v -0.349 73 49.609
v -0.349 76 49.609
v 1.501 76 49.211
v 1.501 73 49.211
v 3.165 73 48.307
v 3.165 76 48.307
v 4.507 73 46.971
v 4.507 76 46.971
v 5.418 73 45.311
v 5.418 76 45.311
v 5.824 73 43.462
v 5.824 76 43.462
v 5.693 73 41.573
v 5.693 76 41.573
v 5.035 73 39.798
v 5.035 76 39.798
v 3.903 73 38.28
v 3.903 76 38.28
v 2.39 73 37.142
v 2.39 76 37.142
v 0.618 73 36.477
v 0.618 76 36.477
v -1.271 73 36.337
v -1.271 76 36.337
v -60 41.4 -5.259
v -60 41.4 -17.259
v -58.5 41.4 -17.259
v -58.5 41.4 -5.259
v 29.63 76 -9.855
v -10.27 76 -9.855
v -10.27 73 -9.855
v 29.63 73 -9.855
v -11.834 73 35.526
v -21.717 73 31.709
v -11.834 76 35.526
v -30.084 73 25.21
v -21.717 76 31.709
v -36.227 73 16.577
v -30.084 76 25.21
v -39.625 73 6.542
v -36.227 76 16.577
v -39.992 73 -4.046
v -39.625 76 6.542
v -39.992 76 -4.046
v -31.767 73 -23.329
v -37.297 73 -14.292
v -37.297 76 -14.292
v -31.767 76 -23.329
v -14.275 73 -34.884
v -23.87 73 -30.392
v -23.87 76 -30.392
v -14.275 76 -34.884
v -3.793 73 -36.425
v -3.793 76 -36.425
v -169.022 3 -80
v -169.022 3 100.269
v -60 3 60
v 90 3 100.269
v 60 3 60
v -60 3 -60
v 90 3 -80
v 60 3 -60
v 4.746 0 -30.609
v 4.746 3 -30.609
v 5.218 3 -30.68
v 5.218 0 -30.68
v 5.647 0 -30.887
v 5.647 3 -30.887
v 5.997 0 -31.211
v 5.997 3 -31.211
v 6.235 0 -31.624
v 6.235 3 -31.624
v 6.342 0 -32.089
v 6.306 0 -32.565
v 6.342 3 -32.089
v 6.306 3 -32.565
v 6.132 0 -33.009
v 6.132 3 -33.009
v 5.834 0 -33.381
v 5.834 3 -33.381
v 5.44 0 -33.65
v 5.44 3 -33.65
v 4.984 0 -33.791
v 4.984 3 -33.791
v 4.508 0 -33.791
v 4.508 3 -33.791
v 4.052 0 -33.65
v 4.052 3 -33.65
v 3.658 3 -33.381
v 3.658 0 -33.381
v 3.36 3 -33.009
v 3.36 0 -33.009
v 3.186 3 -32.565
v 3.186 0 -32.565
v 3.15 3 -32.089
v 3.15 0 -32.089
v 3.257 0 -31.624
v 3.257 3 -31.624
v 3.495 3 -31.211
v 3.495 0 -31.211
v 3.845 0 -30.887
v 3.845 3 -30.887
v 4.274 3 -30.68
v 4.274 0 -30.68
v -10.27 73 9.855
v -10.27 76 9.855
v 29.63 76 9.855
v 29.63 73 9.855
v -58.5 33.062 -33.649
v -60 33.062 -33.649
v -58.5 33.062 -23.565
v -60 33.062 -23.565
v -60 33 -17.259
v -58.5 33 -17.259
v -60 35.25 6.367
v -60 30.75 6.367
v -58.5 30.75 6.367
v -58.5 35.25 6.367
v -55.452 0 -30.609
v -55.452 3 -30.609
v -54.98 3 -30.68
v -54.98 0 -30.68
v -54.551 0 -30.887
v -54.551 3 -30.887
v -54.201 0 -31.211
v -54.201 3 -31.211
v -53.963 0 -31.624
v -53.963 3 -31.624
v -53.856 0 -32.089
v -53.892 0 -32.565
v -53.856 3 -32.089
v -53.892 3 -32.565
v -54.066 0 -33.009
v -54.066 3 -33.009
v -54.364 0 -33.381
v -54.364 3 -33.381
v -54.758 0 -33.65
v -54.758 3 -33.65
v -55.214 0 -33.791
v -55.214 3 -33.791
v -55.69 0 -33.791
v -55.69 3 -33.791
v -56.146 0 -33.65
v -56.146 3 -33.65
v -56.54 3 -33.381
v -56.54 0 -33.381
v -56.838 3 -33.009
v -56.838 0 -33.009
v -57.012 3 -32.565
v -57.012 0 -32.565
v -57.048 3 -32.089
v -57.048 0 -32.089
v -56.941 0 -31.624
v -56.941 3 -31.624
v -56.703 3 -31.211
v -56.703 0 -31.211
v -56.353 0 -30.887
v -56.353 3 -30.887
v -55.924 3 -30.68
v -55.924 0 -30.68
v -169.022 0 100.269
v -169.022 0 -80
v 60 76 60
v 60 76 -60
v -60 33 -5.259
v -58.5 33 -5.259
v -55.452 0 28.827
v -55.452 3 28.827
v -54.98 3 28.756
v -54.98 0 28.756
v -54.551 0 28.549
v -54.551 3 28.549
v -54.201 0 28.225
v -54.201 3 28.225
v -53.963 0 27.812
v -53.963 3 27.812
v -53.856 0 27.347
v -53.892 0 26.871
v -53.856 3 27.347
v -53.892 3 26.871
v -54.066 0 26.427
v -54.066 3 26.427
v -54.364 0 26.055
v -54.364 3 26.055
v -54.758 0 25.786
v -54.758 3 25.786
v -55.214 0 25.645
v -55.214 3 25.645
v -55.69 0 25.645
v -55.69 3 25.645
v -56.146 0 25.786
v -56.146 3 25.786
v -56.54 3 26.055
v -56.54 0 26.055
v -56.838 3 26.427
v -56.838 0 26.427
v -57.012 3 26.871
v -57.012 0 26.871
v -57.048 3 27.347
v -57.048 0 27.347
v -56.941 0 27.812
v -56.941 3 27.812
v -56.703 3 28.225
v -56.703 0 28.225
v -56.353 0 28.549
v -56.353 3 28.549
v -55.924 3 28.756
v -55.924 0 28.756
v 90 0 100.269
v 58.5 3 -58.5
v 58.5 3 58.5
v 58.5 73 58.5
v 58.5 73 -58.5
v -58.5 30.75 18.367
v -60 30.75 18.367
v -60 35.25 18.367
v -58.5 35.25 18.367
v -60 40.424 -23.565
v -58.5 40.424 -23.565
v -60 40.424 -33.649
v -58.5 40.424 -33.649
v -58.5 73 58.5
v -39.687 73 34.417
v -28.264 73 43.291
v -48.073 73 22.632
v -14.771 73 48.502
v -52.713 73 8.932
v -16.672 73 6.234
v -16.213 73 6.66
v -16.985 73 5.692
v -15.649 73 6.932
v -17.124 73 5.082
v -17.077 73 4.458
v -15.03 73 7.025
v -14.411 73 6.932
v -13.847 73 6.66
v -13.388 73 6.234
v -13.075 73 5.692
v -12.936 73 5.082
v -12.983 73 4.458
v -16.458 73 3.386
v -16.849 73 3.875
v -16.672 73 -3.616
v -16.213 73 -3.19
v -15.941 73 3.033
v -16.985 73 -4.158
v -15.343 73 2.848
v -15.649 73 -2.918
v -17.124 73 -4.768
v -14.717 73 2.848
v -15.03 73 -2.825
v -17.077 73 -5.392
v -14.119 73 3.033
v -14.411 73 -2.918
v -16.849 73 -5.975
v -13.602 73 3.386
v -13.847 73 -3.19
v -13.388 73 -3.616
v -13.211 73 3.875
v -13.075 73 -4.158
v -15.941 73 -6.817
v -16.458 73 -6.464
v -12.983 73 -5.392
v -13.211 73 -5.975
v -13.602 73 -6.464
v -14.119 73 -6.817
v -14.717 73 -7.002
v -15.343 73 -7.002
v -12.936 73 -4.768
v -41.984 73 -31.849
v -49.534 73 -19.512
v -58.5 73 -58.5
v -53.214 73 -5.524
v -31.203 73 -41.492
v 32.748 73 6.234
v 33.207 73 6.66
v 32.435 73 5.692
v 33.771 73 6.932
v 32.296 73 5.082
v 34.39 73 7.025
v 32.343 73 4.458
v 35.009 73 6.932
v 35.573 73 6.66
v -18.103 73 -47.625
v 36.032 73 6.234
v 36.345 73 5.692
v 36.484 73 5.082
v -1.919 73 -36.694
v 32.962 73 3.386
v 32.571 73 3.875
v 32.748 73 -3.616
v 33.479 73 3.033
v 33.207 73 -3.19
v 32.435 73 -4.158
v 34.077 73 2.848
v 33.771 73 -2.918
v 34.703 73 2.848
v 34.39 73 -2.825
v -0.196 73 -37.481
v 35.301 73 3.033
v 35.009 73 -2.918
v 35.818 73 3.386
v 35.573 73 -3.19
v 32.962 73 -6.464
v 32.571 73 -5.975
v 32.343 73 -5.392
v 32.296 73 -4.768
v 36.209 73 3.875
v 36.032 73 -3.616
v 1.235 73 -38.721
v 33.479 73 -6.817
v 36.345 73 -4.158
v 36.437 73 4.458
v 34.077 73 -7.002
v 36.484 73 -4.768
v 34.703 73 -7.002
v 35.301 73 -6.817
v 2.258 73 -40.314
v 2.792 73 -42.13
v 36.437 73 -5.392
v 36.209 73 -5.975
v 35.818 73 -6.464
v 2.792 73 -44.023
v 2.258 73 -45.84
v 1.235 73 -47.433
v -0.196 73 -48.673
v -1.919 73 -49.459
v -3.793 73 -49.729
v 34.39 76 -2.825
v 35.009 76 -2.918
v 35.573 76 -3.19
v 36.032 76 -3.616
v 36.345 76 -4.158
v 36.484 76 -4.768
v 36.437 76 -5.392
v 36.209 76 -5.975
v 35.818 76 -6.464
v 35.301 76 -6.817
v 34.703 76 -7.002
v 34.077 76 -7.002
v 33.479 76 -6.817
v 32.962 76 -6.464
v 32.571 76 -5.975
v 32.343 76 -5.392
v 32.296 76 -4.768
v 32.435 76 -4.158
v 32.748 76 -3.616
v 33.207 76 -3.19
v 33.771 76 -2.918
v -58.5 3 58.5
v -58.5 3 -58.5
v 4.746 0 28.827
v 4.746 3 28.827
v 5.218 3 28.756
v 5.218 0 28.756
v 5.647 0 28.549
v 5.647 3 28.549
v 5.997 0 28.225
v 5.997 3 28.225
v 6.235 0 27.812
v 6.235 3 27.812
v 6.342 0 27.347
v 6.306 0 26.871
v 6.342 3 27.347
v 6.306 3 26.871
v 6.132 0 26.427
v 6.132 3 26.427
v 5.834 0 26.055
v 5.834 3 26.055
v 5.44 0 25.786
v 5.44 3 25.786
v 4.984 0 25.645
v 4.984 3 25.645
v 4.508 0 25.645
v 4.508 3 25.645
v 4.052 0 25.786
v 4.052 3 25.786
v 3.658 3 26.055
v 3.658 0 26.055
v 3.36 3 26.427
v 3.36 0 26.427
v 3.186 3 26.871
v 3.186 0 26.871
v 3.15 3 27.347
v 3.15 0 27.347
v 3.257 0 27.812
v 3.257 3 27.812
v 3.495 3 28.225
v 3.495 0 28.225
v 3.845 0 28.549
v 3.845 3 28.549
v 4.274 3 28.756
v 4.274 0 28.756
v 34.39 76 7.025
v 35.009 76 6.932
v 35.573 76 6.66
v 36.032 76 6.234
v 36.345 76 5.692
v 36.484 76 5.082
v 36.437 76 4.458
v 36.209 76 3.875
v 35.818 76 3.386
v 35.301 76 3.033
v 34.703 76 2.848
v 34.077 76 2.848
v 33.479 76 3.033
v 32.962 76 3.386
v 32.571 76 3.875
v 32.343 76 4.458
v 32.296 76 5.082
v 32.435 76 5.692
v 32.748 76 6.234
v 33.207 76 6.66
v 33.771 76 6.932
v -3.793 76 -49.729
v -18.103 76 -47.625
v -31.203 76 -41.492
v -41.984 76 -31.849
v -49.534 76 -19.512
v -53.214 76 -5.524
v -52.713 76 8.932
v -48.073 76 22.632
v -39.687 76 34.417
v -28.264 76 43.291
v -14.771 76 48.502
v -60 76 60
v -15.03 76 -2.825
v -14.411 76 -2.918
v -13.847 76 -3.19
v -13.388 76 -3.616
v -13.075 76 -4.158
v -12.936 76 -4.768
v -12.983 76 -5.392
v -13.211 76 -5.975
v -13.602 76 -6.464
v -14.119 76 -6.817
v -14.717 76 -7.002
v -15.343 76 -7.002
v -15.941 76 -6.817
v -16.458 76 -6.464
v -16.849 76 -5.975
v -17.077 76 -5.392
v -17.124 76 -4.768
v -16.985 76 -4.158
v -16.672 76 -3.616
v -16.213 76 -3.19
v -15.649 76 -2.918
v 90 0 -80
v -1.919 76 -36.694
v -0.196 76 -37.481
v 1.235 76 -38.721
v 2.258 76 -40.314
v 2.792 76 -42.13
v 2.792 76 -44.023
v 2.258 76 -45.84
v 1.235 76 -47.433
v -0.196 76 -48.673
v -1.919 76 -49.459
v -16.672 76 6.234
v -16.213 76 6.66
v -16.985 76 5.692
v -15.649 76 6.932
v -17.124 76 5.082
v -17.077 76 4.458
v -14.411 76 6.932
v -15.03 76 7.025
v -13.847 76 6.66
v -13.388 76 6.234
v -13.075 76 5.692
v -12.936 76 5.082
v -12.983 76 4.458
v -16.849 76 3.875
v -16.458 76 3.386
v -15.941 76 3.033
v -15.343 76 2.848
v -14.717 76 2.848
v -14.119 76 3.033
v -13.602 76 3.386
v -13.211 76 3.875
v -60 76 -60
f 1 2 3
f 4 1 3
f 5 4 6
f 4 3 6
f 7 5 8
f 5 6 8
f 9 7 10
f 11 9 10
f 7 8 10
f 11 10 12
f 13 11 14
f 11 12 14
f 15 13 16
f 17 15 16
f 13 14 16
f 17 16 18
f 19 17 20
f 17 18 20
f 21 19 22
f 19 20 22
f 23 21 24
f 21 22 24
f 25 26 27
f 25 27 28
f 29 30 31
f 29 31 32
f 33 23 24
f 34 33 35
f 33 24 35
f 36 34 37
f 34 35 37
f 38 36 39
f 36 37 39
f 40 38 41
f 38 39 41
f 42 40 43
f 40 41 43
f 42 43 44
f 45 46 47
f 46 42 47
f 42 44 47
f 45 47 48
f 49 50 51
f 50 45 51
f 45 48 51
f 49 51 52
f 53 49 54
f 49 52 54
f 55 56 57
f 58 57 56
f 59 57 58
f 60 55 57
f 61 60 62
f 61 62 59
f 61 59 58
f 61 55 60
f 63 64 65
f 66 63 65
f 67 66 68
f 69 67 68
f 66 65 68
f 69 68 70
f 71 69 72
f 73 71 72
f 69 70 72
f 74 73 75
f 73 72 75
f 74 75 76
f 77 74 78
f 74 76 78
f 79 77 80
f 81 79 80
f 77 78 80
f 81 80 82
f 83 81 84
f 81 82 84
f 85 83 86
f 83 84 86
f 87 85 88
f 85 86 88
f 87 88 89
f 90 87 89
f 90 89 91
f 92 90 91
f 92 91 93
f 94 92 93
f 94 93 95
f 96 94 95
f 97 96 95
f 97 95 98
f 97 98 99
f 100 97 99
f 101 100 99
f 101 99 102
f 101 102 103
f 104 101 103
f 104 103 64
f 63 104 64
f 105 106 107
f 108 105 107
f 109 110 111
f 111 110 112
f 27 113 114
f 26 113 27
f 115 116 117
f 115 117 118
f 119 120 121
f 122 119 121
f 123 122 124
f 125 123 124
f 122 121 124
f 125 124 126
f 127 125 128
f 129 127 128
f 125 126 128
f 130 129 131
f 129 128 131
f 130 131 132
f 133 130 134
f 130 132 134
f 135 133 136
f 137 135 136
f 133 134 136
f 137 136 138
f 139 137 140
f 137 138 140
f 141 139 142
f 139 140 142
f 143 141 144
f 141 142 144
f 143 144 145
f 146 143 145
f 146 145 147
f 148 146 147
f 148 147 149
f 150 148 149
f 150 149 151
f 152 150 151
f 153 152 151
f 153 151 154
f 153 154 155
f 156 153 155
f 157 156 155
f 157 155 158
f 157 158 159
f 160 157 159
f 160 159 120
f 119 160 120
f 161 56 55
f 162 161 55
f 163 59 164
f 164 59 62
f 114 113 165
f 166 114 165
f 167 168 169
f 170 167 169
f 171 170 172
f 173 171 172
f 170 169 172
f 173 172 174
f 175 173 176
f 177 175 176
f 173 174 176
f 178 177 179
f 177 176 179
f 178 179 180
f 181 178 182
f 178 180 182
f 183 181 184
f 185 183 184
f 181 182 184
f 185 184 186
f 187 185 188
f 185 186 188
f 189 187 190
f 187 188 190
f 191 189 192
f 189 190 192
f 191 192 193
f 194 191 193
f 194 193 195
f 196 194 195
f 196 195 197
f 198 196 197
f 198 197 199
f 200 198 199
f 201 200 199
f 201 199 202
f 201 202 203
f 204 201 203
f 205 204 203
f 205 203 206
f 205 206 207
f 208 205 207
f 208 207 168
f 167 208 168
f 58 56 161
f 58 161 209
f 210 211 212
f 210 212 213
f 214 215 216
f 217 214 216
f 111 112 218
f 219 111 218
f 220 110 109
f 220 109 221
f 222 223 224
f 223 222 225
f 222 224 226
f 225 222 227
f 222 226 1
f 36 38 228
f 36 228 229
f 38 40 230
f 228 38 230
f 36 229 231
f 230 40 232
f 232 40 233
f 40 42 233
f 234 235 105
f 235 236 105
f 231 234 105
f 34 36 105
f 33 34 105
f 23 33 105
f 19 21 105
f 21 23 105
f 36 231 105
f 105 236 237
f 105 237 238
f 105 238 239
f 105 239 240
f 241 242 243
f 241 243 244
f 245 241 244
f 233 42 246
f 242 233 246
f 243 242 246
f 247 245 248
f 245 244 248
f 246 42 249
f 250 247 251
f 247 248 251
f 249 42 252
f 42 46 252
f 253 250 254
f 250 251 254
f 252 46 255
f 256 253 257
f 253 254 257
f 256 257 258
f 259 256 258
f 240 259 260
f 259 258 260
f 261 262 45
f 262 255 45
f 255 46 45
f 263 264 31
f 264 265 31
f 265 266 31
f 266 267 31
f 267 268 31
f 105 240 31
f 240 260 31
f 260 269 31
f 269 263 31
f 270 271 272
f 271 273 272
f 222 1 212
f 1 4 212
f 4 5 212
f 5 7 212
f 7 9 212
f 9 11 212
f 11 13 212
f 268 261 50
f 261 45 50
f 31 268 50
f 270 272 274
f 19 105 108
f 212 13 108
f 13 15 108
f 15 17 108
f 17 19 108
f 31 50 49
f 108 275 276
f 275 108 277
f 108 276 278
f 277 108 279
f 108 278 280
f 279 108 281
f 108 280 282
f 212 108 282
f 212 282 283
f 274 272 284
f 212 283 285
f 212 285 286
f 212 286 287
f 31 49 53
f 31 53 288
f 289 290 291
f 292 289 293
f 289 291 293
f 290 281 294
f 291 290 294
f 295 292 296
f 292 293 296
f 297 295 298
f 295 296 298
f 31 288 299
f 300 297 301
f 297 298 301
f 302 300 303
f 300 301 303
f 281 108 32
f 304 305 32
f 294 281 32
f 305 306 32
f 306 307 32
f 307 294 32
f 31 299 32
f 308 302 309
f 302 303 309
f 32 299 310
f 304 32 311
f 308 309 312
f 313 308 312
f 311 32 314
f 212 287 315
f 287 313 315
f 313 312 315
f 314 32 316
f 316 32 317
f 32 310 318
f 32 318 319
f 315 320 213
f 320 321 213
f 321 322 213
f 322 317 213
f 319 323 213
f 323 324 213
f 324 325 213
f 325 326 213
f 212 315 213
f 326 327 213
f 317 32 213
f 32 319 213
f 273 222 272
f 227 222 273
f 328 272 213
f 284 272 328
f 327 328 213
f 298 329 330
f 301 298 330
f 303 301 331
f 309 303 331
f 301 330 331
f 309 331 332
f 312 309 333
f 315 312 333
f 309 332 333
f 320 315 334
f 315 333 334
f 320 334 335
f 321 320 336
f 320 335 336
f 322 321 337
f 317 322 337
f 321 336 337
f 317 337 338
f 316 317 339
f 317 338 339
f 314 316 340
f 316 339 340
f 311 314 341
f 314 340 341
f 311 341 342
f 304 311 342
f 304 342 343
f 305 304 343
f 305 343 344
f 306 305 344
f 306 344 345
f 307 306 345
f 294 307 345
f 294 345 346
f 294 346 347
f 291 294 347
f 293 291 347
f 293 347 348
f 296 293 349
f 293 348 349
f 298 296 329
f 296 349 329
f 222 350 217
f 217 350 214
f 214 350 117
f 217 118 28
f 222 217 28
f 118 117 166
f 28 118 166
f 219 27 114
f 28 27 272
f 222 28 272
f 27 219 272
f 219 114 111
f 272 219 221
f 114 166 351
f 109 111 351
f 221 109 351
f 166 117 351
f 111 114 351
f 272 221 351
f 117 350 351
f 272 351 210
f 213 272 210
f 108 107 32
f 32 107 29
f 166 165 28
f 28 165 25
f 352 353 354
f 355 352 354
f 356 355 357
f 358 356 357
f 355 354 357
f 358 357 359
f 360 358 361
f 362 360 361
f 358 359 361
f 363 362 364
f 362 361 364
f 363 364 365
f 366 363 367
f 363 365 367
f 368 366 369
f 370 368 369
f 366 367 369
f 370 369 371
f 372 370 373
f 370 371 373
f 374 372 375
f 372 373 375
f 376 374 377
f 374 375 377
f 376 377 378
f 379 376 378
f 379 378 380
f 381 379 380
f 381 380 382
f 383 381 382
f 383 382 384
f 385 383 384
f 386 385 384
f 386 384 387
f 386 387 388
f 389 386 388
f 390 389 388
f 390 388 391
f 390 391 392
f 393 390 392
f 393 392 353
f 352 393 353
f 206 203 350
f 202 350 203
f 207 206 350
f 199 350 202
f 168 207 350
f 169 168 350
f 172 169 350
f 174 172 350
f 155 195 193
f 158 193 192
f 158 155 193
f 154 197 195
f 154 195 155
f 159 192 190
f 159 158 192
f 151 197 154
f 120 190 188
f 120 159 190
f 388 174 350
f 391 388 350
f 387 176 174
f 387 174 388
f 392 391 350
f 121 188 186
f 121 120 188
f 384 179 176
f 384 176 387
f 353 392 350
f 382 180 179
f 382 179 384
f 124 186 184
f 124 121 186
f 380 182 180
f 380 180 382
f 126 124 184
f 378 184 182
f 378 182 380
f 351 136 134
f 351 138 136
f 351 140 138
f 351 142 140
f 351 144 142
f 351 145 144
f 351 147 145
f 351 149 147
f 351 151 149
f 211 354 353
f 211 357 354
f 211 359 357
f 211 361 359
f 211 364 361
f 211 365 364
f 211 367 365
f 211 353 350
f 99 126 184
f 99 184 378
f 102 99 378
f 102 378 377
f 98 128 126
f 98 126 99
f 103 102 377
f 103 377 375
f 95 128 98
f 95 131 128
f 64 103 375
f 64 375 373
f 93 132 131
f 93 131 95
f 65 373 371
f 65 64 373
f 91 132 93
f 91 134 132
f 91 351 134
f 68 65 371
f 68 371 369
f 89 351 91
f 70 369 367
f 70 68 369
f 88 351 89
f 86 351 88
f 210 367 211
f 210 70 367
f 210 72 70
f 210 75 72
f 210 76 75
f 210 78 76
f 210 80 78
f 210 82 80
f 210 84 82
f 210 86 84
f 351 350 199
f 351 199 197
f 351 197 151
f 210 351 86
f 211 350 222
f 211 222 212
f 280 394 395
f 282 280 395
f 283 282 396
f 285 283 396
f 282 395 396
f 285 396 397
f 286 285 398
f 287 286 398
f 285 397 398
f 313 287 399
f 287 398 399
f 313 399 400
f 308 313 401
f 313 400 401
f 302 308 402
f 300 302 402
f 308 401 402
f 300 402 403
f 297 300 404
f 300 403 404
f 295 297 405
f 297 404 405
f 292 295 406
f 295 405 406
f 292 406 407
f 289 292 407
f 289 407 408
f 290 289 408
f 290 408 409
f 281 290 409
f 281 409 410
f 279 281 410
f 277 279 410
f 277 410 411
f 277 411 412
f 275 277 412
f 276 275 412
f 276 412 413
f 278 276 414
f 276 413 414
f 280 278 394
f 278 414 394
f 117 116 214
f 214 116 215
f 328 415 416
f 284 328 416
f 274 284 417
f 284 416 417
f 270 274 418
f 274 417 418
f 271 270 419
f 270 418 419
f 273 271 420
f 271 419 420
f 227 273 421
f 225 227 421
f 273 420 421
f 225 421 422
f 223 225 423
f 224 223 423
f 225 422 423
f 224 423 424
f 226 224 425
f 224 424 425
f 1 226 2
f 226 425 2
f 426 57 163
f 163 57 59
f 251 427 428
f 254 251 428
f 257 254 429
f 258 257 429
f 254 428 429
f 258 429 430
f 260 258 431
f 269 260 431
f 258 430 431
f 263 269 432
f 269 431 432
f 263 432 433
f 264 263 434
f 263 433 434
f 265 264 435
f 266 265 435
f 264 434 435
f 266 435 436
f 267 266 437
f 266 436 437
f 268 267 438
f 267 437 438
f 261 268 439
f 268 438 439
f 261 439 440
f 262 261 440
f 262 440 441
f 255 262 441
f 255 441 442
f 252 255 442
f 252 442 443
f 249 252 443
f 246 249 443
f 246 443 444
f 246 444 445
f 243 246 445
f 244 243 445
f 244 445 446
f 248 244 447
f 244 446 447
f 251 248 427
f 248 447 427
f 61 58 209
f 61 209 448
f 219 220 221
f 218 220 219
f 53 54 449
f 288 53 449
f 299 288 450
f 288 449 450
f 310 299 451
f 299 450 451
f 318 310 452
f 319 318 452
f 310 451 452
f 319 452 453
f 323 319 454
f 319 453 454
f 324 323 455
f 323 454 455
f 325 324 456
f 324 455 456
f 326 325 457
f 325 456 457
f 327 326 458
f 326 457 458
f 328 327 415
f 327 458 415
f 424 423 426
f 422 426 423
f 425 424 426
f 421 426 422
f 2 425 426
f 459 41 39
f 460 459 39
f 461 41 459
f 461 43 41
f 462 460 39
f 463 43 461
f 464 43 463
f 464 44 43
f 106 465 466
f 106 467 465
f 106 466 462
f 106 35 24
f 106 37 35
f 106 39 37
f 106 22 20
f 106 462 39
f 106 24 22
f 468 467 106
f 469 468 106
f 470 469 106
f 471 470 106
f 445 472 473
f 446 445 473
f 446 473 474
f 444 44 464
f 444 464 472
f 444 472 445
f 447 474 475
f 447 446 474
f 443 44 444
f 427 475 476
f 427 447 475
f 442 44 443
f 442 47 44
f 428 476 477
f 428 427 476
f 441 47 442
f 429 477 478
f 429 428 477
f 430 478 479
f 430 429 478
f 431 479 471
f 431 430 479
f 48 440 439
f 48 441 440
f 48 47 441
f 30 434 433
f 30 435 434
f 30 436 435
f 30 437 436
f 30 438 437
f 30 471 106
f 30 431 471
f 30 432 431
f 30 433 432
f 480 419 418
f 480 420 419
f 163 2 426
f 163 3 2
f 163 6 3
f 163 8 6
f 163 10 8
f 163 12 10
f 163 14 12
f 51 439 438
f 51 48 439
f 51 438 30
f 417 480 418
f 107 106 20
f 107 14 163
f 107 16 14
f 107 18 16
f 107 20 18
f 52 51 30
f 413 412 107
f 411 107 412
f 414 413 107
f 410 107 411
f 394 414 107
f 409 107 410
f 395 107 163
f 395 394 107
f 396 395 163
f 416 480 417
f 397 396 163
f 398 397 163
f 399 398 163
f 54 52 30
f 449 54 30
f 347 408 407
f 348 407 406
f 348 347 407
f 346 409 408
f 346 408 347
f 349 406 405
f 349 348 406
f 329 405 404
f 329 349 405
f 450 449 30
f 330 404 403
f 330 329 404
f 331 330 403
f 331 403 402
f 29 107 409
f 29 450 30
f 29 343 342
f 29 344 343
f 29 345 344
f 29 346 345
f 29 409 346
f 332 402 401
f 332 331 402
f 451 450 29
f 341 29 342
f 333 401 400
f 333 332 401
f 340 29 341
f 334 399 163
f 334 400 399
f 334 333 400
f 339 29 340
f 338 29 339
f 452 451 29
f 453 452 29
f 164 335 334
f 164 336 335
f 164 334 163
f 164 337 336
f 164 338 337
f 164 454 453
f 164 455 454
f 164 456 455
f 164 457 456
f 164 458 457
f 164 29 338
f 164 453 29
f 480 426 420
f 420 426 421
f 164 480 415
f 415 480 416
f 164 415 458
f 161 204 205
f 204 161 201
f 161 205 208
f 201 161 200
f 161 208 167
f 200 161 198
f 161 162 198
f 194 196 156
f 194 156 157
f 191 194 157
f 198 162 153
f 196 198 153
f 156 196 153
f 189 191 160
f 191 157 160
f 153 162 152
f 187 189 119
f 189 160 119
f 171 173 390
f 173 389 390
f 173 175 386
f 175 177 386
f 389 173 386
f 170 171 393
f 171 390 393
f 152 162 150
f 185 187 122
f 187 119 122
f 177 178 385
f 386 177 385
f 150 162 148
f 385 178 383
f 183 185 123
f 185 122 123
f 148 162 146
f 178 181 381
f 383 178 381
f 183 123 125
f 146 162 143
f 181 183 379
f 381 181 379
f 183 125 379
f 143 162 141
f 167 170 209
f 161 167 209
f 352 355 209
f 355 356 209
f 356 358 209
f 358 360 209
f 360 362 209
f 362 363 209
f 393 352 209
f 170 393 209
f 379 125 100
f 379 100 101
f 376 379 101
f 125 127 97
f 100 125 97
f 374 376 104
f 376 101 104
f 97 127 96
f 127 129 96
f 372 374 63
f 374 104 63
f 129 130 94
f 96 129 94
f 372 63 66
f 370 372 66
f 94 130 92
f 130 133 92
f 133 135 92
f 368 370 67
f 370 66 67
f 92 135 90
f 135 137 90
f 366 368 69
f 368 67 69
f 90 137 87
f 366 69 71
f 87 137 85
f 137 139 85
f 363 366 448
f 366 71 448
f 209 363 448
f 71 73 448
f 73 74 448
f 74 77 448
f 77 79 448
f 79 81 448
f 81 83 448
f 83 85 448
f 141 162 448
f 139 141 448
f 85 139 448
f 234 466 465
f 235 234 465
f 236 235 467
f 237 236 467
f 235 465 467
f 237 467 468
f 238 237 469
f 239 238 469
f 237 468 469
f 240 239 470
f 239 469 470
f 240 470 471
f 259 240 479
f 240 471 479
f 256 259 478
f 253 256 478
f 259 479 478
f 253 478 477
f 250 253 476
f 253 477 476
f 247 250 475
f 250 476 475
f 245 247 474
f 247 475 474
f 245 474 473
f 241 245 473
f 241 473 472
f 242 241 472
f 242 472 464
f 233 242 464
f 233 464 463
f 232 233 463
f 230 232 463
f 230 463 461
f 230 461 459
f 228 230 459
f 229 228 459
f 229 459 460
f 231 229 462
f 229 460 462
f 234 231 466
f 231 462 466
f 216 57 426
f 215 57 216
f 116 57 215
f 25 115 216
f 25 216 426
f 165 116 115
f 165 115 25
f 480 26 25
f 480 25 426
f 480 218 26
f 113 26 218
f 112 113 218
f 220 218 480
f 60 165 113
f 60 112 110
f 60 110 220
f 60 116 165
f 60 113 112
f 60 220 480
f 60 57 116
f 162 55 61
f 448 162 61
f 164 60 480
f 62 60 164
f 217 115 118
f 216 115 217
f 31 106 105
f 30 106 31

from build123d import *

# Parameters (mm, degrees)
SKETCH1_W           = 140
SKETCH1_H           = 160
BOSS_EXTRUDE1_DEPTH = 3
SKETCH2_W           = 120
SKETCH2_H           = 120
SKETCH2_W_2         = 117
SKETCH2_H_2         = 117
BOSS_EXTRUDE2_DEPTH = 70
SKETCH4_W           = 120
SKETCH4_H           = 120
BOSS_EXTRUDE4_DEPTH = 3
SKETCH5_R           = 2.1
SKETCH5_W           = 39.9
SKETCH5_H           = 19.71
CUT_EXTRUDE2_DEPTH  = 3
SKETCH6_W           = 18.298163042
SKETCH6_H           = 17.309993256
CUT_EXTRUDE3_DEPTH  = 3
CUT_EXTRUDE8_DEPTH  = 5
SKETCH15_W          = 259.021634325
SKETCH15_H          = 180.269434884
BOSS_EXTRUDE5_DEPTH = 3
SKETCH18_R          = 1.6
CUT_EXTRUDE9_DEPTH  = 10
SKETCH19_W          = 12
SKETCH19_H          = 4.5
SKETCH19_H_2        = 8.4
SKETCH19_W_2        = 10.084057066
SKETCH19_H_3        = 7.362028533
CUT_EXTRUDE11_DEPTH = 5


with BuildPart() as part:
    # Sketch1 → Boss-Extrude1 (new body)
    with BuildSketch(Plane(origin=(0, 0, 0), x_dir=(1, 0, 0), z_dir=(0, 1, 0))):
        Rectangle(SKETCH1_W, SKETCH1_H)
    extrude(amount=BOSS_EXTRUDE1_DEPTH)

    # Sketch2 → Boss-Extrude2 (add)
    with BuildSketch(Plane(origin=(0, 3, 0), x_dir=(1, 0, 0), z_dir=(0, 1, 0))):
        Rectangle(SKETCH2_W, SKETCH2_H)
        Rectangle(SKETCH2_W_2, SKETCH2_H_2, mode=Mode.SUBTRACT)
    extrude(amount=BOSS_EXTRUDE2_DEPTH)

    # Sketch4 → Boss-Extrude4 (add)
    with BuildSketch(Plane(origin=(0, 73, 0), x_dir=(1, 0, 0), z_dir=(0, 1, 0))):
        Rectangle(SKETCH4_W, SKETCH4_H)
    extrude(amount=BOSS_EXTRUDE4_DEPTH)

    # Sketch5 → Cut-Extrude2 (cut)
    with BuildSketch(Plane(origin=(0, 76, 0), x_dir=(1, 0, 0), z_dir=(0, 1, 0))):
        with Locations(Location((34.39, -4.925, 0), (0, 0, 270))):
            Circle(SKETCH5_R)
        with Locations(Location((34.39, 4.925, 0), (0, 0, 270))):
            Circle(SKETCH5_R)
        with Locations(Location((-15.03, -4.925, 0), (0, 0, 270))):
            Circle(SKETCH5_R)
        with Locations(Location((-15.03, 4.925, 0), (0, 0, 270))):
            Circle(SKETCH5_R)
        with Locations((9.68, 0)):
            Rectangle(SKETCH5_W, SKETCH5_H)
    extrude(amount=-CUT_EXTRUDE2_DEPTH, mode=Mode.SUBTRACT)

    # Sketch6 → Cut-Extrude3 (cut)
    with BuildSketch(Plane(origin=(0, 76, 0), x_dir=(1, 0, 0), z_dir=(0, 1, 0))):
        Rectangle(SKETCH6_W, SKETCH6_H)
    extrude(amount=-CUT_EXTRUDE3_DEPTH, mode=Mode.SUBTRACT)

    # Sketch13 → Cut-Extrude8 (cut)
    with BuildSketch(Plane(origin=(0, 76, 0), x_dir=(1, 0, 0), z_dir=(0, 1, 0))):
        with BuildLine():
            ThreePointArc((-3.792582359, 49.728765052), (-53.491503795, -1.722579942), (-0.349490011, -49.609426409))
            ThreePointArc((-0.349490011, -49.609426409), (5.82592347, -42.51288634), (-1.270616599, -36.337472859))
            ThreePointArc((-1.270616599, -36.337472859), (-40.195607742, -1.261740085), (-3.792582359, 36.42488497))
            ThreePointArc((-3.792582359, 36.42488497), (2.859357682, 43.076825011), (-3.792582359, 49.728765052))
        make_face()
    extrude(amount=-CUT_EXTRUDE8_DEPTH, mode=Mode.SUBTRACT)

    # Sketch15 → Boss-Extrude5 (add)
    with BuildSketch(Plane(origin=(0, 3, 0), x_dir=(1, 0, 0), z_dir=(0, 1, 0))):
        with Locations((-39.510817163, -10.134717442)):
            Rectangle(SKETCH15_W, SKETCH15_H)
    extrude(amount=-BOSS_EXTRUDE5_DEPTH)

    # Sketch18 → Cut-Extrude9 (cut)
    with BuildSketch(Plane(origin=(0, 3, 0), x_dir=(1, 0, 0), z_dir=(0, 1, 0))):
        with Locations(Location((-55.452, -27.227420358, 0), (0, 0, 270))):
            Circle(SKETCH18_R)
        with Locations(Location((-55.452, 32.208579642, 0), (0, 0, 270))):
            Circle(SKETCH18_R)
        with Locations(Location((4.746, 32.208579642, 0), (0, 0, 270))):
            Circle(SKETCH18_R)
        with Locations(Location((4.746, -27.227420358, 0), (0, 0, 270))):
            Circle(SKETCH18_R)
    extrude(amount=-CUT_EXTRUDE9_DEPTH, mode=Mode.SUBTRACT)

    # Sketch19 → Cut-Extrude11 (cut)
    with BuildSketch(Plane.ZY.offset(60)):
        with Locations((12.367420358, 33)):
            Rectangle(SKETCH19_W, SKETCH19_H)
        with Locations((-11.259414931, 37.2)):
            Rectangle(SKETCH19_W, SKETCH19_H_2)
        with Locations((-28.606781654, 36.742945388)):
            Rectangle(SKETCH19_W_2, SKETCH19_H_3)
    extrude(amount=-CUT_EXTRUDE11_DEPTH, mode=Mode.SUBTRACT)


solid = part.part
